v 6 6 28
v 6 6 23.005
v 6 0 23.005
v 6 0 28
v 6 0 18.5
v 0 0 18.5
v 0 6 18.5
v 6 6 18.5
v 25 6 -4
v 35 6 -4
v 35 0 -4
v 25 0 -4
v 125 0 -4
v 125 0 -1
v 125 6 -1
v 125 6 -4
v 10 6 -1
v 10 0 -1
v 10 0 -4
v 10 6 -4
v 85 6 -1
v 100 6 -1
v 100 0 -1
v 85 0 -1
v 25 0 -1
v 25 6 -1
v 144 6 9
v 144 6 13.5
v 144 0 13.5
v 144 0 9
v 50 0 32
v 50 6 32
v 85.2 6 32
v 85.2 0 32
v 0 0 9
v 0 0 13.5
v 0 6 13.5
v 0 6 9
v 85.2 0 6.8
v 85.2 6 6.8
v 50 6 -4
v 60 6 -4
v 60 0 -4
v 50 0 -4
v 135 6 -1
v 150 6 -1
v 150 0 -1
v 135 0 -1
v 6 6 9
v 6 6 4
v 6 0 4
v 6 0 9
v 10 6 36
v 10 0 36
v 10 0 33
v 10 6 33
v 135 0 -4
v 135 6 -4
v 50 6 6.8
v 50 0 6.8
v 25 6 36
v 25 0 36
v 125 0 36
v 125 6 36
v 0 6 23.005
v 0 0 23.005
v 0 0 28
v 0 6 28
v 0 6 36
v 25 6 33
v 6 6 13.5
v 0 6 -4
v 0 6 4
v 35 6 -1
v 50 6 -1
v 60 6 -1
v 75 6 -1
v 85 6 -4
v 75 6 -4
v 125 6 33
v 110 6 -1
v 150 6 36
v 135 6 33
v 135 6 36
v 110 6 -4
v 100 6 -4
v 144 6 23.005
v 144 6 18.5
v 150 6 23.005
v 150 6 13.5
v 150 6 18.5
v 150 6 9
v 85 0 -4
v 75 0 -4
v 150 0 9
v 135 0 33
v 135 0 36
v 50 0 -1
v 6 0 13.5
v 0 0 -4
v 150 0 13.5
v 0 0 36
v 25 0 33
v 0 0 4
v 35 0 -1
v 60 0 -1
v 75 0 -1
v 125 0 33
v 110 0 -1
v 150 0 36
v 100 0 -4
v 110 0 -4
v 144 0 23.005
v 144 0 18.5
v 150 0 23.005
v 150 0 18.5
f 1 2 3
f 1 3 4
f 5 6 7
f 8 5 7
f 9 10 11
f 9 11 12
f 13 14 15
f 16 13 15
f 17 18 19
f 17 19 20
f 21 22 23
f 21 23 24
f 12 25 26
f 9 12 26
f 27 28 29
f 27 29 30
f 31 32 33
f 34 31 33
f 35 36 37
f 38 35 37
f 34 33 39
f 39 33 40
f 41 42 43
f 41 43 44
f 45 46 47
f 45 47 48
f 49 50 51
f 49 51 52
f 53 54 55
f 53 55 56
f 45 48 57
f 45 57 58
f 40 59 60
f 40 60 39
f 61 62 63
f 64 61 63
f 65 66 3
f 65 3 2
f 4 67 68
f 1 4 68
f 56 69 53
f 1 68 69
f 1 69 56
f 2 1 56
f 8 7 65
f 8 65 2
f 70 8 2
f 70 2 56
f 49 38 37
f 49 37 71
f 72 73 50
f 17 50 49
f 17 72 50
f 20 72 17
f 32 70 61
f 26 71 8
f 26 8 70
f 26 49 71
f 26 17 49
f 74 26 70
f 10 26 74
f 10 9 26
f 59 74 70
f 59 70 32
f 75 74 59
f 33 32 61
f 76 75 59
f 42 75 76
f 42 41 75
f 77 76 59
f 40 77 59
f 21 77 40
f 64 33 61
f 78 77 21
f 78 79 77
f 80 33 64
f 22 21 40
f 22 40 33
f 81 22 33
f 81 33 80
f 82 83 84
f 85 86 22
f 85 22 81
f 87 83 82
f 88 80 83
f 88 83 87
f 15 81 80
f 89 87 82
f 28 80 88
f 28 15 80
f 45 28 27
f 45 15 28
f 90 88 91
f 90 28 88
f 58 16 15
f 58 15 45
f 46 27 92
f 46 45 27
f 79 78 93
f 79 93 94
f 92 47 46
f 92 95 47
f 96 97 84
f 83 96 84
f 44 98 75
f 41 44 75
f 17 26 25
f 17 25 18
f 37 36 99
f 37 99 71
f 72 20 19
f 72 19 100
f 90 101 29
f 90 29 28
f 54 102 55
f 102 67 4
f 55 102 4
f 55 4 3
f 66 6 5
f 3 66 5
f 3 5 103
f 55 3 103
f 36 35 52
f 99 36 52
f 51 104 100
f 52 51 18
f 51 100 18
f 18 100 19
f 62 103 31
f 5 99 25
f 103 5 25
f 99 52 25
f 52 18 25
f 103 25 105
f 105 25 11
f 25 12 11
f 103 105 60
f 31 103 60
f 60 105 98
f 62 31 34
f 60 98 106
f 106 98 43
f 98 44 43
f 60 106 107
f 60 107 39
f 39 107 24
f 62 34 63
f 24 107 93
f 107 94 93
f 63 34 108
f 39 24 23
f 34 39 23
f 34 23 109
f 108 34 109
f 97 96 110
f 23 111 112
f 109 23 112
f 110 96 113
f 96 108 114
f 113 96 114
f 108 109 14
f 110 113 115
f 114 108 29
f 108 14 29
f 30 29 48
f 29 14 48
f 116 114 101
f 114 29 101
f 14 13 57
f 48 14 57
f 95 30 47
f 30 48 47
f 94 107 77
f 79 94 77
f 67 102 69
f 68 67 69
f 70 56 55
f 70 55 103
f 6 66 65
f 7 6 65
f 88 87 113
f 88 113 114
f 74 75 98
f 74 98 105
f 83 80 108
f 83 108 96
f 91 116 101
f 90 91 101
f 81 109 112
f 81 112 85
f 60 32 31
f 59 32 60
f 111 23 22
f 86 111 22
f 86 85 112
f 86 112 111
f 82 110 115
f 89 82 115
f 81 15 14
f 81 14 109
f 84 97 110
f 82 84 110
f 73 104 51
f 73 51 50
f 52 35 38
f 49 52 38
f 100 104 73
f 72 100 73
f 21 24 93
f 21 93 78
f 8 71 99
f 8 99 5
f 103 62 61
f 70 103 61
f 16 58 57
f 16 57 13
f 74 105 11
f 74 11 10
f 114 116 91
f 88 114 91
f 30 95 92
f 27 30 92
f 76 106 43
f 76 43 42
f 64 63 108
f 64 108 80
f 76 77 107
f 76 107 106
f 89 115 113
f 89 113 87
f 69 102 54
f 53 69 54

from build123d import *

# Parameters (mm, degrees)
SKETCH_1_W             = 150
SKETCH_1_H             = 36
EXTRUDE_2_DEPTH        = 6
SKETCH_6_W             = 10
SKETCH_6_H             = 6
EXTRUDE_4_DEPTH        = 4
PATTERN_LINEAR_1_COUNT = 6
PATTERN_LINEAR_1_PITCH = 25
SKETCH_8_W             = 5
SKETCH_8_H             = 6
SKETCH_8_W_2           = 4.995224333
CUT_EXTRUDE_3_DEPTH    = 6
SKETCH_11_W            = 4.504775667
SKETCH_11_H            = 6
SKETCH_11_W_2          = 4.5
CUT_EXTRUDE_4_DEPTH    = 6
SKETCH_12_W            = 35.2
SKETCH_12_H            = 25.2
CUT_EXTRUDE_5_DEPTH    = 155.376163963
SKETCH_14_W            = 15
SKETCH_14_H            = 6
SKETCH_14_W_2          = 10
CUT_EXTRUDE_6_DEPTH    = 4
SKETCH_15_W            = 15
SKETCH_15_H            = 6
EXTRUDE_5_DEPTH        = 1
PATTERN_LINEAR_2_COUNT = 5
PATTERN_LINEAR_2_PITCH = 25
SKETCH_16_W            = 15
SKETCH_16_H            = 6
EXTRUDE_6_DEPTH        = 1
SKETCH_17_W            = 10
SKETCH_17_H            = 6
EXTRUDE_7_DEPTH        = 1
SKETCH_18_W            = 15
SKETCH_18_H            = 6
EXTRUDE_8_DEPTH        = 1


with BuildPart() as part:
    # Эскиз1 → Бобышка-Вытянуть2 (new body)
    with BuildSketch(Plane(origin=(0, 0, 0), x_dir=(1, 0, 0), z_dir=(0, 1, 0))):
        with Locations((75, -18)):
            Rectangle(SKETCH_1_W, SKETCH_1_H)
    extrude(amount=EXTRUDE_2_DEPTH)

    # Эскиз6 → Бобышка-Вытянуть4 (add)
    with BuildSketch(Plane(origin=(0, 0, 0), x_dir=(-1, 0, 0), z_dir=(0, 0, -1))):
        with Locations((-5, 3)):
            Rectangle(SKETCH_6_W, SKETCH_6_H)
    extrude_4 = extrude(amount=EXTRUDE_4_DEPTH)

    # Линейный массив1: Бобышка-Вытянуть4 ×6
    with Locations(*[(i * PATTERN_LINEAR_1_PITCH, 0, 0) for i in range(1, PATTERN_LINEAR_1_COUNT)]):
        add(extrude_4)

    # Эскиз8 → Вырез-Вытянуть3 (cut)
    with BuildSketch(Plane.ZY):
        with Locations((6.5, 3)):
            Rectangle(SKETCH_8_W, SKETCH_8_H)
        with Locations((16, 3)):
            Rectangle(SKETCH_8_W, SKETCH_8_H)
        with Locations((25.502387834, 3)):
            Rectangle(SKETCH_8_W_2, SKETCH_8_H)
    extrude(amount=-CUT_EXTRUDE_3_DEPTH, mode=Mode.SUBTRACT)

    # Эскиз11 → Вырез-Вытянуть4 (cut)
    with BuildSketch(Plane(origin=(150, 0, 0), x_dir=(0, 0, -1), z_dir=(1, 0, 0))):
        with Locations((-20.752387834, 3)):
            Rectangle(SKETCH_11_W, SKETCH_11_H)
        with Locations((-11.25, 3)):
            Rectangle(SKETCH_11_W_2, SKETCH_11_H)
    extrude(amount=-CUT_EXTRUDE_4_DEPTH, mode=Mode.SUBTRACT)

    # Эскиз12 → Вырез-Вытянуть5 (cut, through all)
    with BuildSketch(Plane(origin=(0, 6, 0), x_dir=(1, 0, 0), z_dir=(0, 1, 0))):
        with Locations((67.6, -19.4)):
            Rectangle(SKETCH_12_W, SKETCH_12_H)
    extrude(amount=-CUT_EXTRUDE_5_DEPTH, mode=Mode.SUBTRACT)

    # Эскиз14 → Вырез-Вытянуть6 (cut)
    with BuildSketch(Plane.XY.offset(36)):
        with Locations((17.5, 3)):
            Rectangle(SKETCH_14_W, SKETCH_14_H)
        with Locations((130, 3)):
            Rectangle(SKETCH_14_W_2, SKETCH_14_H)
    extrude(amount=-CUT_EXTRUDE_6_DEPTH, mode=Mode.SUBTRACT)

    # Эскиз15 → Бобышка-Вытянуть5 (add)
    with BuildSketch(Plane(origin=(0, 0, 0), x_dir=(-1, 0, 0), z_dir=(0, 0, -1))):
        with Locations((-17.5, 3)):
            Rectangle(SKETCH_15_W, SKETCH_15_H)
    extrude_5 = extrude(amount=EXTRUDE_5_DEPTH)

    # Линейный массив2: Бобышка-Вытянуть5 ×5
    with Locations(*[(i * PATTERN_LINEAR_2_PITCH, 0, 0) for i in range(1, PATTERN_LINEAR_2_COUNT)]):
        add(extrude_5)

    # Эскиз16 → Бобышка-Вытянуть6 (add)
    with BuildSketch(Plane(origin=(0, 0, 0), x_dir=(-1, 0, 0), z_dir=(0, 0, -1))):
        with Locations((-142.5, 3)):
            Rectangle(SKETCH_16_W, SKETCH_16_H)
    extrude(amount=EXTRUDE_6_DEPTH)

    # Эскиз17 → Бобышка-Вытянуть7 (add)
    with BuildSketch(Plane.XY.offset(32)):
        with Locations((130, 3)):
            Rectangle(SKETCH_17_W, SKETCH_17_H)
    extrude(amount=EXTRUDE_7_DEPTH)

    # Эскиз18 → Бобышка-Вытянуть8 (add)
    with BuildSketch(Plane.XY.offset(32)):
        with Locations((17.5, 3)):
            Rectangle(SKETCH_18_W, SKETCH_18_H)
    extrude(amount=EXTRUDE_8_DEPTH)


solid = part.part
